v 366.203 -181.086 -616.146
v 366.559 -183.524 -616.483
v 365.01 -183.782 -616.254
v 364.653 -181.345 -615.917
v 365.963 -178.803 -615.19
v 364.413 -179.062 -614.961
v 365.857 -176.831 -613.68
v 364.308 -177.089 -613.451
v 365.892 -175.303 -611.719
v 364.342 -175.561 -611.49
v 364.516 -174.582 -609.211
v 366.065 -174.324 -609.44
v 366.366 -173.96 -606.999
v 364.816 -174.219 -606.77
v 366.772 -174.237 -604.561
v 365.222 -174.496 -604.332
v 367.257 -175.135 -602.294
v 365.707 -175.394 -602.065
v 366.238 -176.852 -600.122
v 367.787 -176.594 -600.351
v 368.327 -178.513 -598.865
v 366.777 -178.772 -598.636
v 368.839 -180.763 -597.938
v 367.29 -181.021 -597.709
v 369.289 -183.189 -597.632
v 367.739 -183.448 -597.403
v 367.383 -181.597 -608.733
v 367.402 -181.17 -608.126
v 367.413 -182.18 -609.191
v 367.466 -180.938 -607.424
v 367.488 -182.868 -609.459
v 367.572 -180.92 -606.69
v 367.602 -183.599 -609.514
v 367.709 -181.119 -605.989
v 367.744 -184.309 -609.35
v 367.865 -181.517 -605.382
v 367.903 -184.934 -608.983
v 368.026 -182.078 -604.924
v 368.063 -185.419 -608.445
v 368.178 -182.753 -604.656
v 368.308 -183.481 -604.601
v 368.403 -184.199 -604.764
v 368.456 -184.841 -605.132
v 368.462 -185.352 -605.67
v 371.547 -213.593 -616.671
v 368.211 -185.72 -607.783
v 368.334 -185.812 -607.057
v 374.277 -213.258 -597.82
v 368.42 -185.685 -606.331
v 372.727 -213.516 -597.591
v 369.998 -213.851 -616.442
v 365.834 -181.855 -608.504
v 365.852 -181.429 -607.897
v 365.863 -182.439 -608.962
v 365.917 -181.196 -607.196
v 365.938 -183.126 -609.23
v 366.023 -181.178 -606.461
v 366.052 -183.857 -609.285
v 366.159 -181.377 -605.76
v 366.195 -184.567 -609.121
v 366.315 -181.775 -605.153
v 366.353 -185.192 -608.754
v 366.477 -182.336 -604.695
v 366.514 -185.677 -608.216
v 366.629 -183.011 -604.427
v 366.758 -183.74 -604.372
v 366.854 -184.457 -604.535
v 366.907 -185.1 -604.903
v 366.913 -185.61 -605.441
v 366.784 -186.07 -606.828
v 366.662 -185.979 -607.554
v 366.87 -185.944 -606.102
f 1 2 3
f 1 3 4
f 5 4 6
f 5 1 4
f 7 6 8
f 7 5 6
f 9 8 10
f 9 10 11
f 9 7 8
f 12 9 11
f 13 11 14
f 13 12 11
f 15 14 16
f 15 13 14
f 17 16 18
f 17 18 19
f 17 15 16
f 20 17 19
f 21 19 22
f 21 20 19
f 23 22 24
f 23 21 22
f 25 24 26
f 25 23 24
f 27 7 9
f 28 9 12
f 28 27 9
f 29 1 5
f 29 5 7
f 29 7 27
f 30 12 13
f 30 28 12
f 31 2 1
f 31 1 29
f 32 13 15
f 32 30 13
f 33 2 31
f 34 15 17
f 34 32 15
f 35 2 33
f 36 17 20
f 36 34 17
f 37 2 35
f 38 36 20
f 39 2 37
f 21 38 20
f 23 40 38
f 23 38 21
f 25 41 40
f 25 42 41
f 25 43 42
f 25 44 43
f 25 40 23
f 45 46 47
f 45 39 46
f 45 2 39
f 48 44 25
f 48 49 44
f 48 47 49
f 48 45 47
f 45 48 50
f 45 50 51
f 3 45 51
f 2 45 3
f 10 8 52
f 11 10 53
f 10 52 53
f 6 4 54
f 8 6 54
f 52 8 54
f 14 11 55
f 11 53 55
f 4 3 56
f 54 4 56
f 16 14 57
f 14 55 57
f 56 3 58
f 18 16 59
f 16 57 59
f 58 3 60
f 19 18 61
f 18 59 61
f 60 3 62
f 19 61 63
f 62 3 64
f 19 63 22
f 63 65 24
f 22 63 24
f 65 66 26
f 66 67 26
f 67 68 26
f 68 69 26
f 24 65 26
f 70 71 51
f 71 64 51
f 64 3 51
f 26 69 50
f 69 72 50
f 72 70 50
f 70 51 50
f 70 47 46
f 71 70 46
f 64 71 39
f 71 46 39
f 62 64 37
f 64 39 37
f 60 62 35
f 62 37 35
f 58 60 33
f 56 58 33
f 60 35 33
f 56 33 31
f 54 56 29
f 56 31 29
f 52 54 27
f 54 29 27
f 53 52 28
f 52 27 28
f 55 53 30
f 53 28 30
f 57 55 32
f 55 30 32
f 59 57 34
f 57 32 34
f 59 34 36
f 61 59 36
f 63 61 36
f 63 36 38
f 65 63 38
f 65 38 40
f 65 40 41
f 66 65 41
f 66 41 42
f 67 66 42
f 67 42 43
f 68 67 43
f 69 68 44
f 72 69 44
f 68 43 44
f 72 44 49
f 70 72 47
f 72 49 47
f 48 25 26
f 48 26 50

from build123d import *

# Parameters (mm, degrees)
SKETCH2_R           = 2.4892
BOSS_EXTRUDE1_DEPTH = 1.5875


with BuildPart() as part:
    # Sketch2 → Boss-Extrude1 (new body)
    with BuildSketch(Plane(origin=(-406.836680709, 67.862442728, -60.114831645), x_dir=(-0.15204147849631244, -0.03655570855361372, 0.9876978632095945), z_dir=(0.9760593070661704, -0.16281169315785926, 0.1442240675496927))):
        with BuildLine():
            Line((-544.785785419, 305.655391385), (-546.457439277, 275.221266239))
            ThreePointArc((-546.457439277, 275.221266239), (-537.469166999, 265.1882103), (-527.436111061, 274.176482578))
            Line((-527.436111061, 274.176482578), (-525.764457203, 304.610607723))
            Line((-525.764457203, 304.610607723), (-544.785785419, 305.655391385))
        make_face()
        with Locations(Location((-536.946775169, 274.698874408, 0), (0, 0, 86.498585174))):
            Circle(SKETCH2_R, mode=Mode.SUBTRACT)
    extrude(amount=BOSS_EXTRUDE1_DEPTH)


with BuildPart() as body_2:
    # Mirror2: mirrored copy
    add(part.part.mirror(Plane(origin=(0, 0, 0), x_dir=(0, 0, 1), z_dir=(1, 0, 0))))


solid = body_2.part
